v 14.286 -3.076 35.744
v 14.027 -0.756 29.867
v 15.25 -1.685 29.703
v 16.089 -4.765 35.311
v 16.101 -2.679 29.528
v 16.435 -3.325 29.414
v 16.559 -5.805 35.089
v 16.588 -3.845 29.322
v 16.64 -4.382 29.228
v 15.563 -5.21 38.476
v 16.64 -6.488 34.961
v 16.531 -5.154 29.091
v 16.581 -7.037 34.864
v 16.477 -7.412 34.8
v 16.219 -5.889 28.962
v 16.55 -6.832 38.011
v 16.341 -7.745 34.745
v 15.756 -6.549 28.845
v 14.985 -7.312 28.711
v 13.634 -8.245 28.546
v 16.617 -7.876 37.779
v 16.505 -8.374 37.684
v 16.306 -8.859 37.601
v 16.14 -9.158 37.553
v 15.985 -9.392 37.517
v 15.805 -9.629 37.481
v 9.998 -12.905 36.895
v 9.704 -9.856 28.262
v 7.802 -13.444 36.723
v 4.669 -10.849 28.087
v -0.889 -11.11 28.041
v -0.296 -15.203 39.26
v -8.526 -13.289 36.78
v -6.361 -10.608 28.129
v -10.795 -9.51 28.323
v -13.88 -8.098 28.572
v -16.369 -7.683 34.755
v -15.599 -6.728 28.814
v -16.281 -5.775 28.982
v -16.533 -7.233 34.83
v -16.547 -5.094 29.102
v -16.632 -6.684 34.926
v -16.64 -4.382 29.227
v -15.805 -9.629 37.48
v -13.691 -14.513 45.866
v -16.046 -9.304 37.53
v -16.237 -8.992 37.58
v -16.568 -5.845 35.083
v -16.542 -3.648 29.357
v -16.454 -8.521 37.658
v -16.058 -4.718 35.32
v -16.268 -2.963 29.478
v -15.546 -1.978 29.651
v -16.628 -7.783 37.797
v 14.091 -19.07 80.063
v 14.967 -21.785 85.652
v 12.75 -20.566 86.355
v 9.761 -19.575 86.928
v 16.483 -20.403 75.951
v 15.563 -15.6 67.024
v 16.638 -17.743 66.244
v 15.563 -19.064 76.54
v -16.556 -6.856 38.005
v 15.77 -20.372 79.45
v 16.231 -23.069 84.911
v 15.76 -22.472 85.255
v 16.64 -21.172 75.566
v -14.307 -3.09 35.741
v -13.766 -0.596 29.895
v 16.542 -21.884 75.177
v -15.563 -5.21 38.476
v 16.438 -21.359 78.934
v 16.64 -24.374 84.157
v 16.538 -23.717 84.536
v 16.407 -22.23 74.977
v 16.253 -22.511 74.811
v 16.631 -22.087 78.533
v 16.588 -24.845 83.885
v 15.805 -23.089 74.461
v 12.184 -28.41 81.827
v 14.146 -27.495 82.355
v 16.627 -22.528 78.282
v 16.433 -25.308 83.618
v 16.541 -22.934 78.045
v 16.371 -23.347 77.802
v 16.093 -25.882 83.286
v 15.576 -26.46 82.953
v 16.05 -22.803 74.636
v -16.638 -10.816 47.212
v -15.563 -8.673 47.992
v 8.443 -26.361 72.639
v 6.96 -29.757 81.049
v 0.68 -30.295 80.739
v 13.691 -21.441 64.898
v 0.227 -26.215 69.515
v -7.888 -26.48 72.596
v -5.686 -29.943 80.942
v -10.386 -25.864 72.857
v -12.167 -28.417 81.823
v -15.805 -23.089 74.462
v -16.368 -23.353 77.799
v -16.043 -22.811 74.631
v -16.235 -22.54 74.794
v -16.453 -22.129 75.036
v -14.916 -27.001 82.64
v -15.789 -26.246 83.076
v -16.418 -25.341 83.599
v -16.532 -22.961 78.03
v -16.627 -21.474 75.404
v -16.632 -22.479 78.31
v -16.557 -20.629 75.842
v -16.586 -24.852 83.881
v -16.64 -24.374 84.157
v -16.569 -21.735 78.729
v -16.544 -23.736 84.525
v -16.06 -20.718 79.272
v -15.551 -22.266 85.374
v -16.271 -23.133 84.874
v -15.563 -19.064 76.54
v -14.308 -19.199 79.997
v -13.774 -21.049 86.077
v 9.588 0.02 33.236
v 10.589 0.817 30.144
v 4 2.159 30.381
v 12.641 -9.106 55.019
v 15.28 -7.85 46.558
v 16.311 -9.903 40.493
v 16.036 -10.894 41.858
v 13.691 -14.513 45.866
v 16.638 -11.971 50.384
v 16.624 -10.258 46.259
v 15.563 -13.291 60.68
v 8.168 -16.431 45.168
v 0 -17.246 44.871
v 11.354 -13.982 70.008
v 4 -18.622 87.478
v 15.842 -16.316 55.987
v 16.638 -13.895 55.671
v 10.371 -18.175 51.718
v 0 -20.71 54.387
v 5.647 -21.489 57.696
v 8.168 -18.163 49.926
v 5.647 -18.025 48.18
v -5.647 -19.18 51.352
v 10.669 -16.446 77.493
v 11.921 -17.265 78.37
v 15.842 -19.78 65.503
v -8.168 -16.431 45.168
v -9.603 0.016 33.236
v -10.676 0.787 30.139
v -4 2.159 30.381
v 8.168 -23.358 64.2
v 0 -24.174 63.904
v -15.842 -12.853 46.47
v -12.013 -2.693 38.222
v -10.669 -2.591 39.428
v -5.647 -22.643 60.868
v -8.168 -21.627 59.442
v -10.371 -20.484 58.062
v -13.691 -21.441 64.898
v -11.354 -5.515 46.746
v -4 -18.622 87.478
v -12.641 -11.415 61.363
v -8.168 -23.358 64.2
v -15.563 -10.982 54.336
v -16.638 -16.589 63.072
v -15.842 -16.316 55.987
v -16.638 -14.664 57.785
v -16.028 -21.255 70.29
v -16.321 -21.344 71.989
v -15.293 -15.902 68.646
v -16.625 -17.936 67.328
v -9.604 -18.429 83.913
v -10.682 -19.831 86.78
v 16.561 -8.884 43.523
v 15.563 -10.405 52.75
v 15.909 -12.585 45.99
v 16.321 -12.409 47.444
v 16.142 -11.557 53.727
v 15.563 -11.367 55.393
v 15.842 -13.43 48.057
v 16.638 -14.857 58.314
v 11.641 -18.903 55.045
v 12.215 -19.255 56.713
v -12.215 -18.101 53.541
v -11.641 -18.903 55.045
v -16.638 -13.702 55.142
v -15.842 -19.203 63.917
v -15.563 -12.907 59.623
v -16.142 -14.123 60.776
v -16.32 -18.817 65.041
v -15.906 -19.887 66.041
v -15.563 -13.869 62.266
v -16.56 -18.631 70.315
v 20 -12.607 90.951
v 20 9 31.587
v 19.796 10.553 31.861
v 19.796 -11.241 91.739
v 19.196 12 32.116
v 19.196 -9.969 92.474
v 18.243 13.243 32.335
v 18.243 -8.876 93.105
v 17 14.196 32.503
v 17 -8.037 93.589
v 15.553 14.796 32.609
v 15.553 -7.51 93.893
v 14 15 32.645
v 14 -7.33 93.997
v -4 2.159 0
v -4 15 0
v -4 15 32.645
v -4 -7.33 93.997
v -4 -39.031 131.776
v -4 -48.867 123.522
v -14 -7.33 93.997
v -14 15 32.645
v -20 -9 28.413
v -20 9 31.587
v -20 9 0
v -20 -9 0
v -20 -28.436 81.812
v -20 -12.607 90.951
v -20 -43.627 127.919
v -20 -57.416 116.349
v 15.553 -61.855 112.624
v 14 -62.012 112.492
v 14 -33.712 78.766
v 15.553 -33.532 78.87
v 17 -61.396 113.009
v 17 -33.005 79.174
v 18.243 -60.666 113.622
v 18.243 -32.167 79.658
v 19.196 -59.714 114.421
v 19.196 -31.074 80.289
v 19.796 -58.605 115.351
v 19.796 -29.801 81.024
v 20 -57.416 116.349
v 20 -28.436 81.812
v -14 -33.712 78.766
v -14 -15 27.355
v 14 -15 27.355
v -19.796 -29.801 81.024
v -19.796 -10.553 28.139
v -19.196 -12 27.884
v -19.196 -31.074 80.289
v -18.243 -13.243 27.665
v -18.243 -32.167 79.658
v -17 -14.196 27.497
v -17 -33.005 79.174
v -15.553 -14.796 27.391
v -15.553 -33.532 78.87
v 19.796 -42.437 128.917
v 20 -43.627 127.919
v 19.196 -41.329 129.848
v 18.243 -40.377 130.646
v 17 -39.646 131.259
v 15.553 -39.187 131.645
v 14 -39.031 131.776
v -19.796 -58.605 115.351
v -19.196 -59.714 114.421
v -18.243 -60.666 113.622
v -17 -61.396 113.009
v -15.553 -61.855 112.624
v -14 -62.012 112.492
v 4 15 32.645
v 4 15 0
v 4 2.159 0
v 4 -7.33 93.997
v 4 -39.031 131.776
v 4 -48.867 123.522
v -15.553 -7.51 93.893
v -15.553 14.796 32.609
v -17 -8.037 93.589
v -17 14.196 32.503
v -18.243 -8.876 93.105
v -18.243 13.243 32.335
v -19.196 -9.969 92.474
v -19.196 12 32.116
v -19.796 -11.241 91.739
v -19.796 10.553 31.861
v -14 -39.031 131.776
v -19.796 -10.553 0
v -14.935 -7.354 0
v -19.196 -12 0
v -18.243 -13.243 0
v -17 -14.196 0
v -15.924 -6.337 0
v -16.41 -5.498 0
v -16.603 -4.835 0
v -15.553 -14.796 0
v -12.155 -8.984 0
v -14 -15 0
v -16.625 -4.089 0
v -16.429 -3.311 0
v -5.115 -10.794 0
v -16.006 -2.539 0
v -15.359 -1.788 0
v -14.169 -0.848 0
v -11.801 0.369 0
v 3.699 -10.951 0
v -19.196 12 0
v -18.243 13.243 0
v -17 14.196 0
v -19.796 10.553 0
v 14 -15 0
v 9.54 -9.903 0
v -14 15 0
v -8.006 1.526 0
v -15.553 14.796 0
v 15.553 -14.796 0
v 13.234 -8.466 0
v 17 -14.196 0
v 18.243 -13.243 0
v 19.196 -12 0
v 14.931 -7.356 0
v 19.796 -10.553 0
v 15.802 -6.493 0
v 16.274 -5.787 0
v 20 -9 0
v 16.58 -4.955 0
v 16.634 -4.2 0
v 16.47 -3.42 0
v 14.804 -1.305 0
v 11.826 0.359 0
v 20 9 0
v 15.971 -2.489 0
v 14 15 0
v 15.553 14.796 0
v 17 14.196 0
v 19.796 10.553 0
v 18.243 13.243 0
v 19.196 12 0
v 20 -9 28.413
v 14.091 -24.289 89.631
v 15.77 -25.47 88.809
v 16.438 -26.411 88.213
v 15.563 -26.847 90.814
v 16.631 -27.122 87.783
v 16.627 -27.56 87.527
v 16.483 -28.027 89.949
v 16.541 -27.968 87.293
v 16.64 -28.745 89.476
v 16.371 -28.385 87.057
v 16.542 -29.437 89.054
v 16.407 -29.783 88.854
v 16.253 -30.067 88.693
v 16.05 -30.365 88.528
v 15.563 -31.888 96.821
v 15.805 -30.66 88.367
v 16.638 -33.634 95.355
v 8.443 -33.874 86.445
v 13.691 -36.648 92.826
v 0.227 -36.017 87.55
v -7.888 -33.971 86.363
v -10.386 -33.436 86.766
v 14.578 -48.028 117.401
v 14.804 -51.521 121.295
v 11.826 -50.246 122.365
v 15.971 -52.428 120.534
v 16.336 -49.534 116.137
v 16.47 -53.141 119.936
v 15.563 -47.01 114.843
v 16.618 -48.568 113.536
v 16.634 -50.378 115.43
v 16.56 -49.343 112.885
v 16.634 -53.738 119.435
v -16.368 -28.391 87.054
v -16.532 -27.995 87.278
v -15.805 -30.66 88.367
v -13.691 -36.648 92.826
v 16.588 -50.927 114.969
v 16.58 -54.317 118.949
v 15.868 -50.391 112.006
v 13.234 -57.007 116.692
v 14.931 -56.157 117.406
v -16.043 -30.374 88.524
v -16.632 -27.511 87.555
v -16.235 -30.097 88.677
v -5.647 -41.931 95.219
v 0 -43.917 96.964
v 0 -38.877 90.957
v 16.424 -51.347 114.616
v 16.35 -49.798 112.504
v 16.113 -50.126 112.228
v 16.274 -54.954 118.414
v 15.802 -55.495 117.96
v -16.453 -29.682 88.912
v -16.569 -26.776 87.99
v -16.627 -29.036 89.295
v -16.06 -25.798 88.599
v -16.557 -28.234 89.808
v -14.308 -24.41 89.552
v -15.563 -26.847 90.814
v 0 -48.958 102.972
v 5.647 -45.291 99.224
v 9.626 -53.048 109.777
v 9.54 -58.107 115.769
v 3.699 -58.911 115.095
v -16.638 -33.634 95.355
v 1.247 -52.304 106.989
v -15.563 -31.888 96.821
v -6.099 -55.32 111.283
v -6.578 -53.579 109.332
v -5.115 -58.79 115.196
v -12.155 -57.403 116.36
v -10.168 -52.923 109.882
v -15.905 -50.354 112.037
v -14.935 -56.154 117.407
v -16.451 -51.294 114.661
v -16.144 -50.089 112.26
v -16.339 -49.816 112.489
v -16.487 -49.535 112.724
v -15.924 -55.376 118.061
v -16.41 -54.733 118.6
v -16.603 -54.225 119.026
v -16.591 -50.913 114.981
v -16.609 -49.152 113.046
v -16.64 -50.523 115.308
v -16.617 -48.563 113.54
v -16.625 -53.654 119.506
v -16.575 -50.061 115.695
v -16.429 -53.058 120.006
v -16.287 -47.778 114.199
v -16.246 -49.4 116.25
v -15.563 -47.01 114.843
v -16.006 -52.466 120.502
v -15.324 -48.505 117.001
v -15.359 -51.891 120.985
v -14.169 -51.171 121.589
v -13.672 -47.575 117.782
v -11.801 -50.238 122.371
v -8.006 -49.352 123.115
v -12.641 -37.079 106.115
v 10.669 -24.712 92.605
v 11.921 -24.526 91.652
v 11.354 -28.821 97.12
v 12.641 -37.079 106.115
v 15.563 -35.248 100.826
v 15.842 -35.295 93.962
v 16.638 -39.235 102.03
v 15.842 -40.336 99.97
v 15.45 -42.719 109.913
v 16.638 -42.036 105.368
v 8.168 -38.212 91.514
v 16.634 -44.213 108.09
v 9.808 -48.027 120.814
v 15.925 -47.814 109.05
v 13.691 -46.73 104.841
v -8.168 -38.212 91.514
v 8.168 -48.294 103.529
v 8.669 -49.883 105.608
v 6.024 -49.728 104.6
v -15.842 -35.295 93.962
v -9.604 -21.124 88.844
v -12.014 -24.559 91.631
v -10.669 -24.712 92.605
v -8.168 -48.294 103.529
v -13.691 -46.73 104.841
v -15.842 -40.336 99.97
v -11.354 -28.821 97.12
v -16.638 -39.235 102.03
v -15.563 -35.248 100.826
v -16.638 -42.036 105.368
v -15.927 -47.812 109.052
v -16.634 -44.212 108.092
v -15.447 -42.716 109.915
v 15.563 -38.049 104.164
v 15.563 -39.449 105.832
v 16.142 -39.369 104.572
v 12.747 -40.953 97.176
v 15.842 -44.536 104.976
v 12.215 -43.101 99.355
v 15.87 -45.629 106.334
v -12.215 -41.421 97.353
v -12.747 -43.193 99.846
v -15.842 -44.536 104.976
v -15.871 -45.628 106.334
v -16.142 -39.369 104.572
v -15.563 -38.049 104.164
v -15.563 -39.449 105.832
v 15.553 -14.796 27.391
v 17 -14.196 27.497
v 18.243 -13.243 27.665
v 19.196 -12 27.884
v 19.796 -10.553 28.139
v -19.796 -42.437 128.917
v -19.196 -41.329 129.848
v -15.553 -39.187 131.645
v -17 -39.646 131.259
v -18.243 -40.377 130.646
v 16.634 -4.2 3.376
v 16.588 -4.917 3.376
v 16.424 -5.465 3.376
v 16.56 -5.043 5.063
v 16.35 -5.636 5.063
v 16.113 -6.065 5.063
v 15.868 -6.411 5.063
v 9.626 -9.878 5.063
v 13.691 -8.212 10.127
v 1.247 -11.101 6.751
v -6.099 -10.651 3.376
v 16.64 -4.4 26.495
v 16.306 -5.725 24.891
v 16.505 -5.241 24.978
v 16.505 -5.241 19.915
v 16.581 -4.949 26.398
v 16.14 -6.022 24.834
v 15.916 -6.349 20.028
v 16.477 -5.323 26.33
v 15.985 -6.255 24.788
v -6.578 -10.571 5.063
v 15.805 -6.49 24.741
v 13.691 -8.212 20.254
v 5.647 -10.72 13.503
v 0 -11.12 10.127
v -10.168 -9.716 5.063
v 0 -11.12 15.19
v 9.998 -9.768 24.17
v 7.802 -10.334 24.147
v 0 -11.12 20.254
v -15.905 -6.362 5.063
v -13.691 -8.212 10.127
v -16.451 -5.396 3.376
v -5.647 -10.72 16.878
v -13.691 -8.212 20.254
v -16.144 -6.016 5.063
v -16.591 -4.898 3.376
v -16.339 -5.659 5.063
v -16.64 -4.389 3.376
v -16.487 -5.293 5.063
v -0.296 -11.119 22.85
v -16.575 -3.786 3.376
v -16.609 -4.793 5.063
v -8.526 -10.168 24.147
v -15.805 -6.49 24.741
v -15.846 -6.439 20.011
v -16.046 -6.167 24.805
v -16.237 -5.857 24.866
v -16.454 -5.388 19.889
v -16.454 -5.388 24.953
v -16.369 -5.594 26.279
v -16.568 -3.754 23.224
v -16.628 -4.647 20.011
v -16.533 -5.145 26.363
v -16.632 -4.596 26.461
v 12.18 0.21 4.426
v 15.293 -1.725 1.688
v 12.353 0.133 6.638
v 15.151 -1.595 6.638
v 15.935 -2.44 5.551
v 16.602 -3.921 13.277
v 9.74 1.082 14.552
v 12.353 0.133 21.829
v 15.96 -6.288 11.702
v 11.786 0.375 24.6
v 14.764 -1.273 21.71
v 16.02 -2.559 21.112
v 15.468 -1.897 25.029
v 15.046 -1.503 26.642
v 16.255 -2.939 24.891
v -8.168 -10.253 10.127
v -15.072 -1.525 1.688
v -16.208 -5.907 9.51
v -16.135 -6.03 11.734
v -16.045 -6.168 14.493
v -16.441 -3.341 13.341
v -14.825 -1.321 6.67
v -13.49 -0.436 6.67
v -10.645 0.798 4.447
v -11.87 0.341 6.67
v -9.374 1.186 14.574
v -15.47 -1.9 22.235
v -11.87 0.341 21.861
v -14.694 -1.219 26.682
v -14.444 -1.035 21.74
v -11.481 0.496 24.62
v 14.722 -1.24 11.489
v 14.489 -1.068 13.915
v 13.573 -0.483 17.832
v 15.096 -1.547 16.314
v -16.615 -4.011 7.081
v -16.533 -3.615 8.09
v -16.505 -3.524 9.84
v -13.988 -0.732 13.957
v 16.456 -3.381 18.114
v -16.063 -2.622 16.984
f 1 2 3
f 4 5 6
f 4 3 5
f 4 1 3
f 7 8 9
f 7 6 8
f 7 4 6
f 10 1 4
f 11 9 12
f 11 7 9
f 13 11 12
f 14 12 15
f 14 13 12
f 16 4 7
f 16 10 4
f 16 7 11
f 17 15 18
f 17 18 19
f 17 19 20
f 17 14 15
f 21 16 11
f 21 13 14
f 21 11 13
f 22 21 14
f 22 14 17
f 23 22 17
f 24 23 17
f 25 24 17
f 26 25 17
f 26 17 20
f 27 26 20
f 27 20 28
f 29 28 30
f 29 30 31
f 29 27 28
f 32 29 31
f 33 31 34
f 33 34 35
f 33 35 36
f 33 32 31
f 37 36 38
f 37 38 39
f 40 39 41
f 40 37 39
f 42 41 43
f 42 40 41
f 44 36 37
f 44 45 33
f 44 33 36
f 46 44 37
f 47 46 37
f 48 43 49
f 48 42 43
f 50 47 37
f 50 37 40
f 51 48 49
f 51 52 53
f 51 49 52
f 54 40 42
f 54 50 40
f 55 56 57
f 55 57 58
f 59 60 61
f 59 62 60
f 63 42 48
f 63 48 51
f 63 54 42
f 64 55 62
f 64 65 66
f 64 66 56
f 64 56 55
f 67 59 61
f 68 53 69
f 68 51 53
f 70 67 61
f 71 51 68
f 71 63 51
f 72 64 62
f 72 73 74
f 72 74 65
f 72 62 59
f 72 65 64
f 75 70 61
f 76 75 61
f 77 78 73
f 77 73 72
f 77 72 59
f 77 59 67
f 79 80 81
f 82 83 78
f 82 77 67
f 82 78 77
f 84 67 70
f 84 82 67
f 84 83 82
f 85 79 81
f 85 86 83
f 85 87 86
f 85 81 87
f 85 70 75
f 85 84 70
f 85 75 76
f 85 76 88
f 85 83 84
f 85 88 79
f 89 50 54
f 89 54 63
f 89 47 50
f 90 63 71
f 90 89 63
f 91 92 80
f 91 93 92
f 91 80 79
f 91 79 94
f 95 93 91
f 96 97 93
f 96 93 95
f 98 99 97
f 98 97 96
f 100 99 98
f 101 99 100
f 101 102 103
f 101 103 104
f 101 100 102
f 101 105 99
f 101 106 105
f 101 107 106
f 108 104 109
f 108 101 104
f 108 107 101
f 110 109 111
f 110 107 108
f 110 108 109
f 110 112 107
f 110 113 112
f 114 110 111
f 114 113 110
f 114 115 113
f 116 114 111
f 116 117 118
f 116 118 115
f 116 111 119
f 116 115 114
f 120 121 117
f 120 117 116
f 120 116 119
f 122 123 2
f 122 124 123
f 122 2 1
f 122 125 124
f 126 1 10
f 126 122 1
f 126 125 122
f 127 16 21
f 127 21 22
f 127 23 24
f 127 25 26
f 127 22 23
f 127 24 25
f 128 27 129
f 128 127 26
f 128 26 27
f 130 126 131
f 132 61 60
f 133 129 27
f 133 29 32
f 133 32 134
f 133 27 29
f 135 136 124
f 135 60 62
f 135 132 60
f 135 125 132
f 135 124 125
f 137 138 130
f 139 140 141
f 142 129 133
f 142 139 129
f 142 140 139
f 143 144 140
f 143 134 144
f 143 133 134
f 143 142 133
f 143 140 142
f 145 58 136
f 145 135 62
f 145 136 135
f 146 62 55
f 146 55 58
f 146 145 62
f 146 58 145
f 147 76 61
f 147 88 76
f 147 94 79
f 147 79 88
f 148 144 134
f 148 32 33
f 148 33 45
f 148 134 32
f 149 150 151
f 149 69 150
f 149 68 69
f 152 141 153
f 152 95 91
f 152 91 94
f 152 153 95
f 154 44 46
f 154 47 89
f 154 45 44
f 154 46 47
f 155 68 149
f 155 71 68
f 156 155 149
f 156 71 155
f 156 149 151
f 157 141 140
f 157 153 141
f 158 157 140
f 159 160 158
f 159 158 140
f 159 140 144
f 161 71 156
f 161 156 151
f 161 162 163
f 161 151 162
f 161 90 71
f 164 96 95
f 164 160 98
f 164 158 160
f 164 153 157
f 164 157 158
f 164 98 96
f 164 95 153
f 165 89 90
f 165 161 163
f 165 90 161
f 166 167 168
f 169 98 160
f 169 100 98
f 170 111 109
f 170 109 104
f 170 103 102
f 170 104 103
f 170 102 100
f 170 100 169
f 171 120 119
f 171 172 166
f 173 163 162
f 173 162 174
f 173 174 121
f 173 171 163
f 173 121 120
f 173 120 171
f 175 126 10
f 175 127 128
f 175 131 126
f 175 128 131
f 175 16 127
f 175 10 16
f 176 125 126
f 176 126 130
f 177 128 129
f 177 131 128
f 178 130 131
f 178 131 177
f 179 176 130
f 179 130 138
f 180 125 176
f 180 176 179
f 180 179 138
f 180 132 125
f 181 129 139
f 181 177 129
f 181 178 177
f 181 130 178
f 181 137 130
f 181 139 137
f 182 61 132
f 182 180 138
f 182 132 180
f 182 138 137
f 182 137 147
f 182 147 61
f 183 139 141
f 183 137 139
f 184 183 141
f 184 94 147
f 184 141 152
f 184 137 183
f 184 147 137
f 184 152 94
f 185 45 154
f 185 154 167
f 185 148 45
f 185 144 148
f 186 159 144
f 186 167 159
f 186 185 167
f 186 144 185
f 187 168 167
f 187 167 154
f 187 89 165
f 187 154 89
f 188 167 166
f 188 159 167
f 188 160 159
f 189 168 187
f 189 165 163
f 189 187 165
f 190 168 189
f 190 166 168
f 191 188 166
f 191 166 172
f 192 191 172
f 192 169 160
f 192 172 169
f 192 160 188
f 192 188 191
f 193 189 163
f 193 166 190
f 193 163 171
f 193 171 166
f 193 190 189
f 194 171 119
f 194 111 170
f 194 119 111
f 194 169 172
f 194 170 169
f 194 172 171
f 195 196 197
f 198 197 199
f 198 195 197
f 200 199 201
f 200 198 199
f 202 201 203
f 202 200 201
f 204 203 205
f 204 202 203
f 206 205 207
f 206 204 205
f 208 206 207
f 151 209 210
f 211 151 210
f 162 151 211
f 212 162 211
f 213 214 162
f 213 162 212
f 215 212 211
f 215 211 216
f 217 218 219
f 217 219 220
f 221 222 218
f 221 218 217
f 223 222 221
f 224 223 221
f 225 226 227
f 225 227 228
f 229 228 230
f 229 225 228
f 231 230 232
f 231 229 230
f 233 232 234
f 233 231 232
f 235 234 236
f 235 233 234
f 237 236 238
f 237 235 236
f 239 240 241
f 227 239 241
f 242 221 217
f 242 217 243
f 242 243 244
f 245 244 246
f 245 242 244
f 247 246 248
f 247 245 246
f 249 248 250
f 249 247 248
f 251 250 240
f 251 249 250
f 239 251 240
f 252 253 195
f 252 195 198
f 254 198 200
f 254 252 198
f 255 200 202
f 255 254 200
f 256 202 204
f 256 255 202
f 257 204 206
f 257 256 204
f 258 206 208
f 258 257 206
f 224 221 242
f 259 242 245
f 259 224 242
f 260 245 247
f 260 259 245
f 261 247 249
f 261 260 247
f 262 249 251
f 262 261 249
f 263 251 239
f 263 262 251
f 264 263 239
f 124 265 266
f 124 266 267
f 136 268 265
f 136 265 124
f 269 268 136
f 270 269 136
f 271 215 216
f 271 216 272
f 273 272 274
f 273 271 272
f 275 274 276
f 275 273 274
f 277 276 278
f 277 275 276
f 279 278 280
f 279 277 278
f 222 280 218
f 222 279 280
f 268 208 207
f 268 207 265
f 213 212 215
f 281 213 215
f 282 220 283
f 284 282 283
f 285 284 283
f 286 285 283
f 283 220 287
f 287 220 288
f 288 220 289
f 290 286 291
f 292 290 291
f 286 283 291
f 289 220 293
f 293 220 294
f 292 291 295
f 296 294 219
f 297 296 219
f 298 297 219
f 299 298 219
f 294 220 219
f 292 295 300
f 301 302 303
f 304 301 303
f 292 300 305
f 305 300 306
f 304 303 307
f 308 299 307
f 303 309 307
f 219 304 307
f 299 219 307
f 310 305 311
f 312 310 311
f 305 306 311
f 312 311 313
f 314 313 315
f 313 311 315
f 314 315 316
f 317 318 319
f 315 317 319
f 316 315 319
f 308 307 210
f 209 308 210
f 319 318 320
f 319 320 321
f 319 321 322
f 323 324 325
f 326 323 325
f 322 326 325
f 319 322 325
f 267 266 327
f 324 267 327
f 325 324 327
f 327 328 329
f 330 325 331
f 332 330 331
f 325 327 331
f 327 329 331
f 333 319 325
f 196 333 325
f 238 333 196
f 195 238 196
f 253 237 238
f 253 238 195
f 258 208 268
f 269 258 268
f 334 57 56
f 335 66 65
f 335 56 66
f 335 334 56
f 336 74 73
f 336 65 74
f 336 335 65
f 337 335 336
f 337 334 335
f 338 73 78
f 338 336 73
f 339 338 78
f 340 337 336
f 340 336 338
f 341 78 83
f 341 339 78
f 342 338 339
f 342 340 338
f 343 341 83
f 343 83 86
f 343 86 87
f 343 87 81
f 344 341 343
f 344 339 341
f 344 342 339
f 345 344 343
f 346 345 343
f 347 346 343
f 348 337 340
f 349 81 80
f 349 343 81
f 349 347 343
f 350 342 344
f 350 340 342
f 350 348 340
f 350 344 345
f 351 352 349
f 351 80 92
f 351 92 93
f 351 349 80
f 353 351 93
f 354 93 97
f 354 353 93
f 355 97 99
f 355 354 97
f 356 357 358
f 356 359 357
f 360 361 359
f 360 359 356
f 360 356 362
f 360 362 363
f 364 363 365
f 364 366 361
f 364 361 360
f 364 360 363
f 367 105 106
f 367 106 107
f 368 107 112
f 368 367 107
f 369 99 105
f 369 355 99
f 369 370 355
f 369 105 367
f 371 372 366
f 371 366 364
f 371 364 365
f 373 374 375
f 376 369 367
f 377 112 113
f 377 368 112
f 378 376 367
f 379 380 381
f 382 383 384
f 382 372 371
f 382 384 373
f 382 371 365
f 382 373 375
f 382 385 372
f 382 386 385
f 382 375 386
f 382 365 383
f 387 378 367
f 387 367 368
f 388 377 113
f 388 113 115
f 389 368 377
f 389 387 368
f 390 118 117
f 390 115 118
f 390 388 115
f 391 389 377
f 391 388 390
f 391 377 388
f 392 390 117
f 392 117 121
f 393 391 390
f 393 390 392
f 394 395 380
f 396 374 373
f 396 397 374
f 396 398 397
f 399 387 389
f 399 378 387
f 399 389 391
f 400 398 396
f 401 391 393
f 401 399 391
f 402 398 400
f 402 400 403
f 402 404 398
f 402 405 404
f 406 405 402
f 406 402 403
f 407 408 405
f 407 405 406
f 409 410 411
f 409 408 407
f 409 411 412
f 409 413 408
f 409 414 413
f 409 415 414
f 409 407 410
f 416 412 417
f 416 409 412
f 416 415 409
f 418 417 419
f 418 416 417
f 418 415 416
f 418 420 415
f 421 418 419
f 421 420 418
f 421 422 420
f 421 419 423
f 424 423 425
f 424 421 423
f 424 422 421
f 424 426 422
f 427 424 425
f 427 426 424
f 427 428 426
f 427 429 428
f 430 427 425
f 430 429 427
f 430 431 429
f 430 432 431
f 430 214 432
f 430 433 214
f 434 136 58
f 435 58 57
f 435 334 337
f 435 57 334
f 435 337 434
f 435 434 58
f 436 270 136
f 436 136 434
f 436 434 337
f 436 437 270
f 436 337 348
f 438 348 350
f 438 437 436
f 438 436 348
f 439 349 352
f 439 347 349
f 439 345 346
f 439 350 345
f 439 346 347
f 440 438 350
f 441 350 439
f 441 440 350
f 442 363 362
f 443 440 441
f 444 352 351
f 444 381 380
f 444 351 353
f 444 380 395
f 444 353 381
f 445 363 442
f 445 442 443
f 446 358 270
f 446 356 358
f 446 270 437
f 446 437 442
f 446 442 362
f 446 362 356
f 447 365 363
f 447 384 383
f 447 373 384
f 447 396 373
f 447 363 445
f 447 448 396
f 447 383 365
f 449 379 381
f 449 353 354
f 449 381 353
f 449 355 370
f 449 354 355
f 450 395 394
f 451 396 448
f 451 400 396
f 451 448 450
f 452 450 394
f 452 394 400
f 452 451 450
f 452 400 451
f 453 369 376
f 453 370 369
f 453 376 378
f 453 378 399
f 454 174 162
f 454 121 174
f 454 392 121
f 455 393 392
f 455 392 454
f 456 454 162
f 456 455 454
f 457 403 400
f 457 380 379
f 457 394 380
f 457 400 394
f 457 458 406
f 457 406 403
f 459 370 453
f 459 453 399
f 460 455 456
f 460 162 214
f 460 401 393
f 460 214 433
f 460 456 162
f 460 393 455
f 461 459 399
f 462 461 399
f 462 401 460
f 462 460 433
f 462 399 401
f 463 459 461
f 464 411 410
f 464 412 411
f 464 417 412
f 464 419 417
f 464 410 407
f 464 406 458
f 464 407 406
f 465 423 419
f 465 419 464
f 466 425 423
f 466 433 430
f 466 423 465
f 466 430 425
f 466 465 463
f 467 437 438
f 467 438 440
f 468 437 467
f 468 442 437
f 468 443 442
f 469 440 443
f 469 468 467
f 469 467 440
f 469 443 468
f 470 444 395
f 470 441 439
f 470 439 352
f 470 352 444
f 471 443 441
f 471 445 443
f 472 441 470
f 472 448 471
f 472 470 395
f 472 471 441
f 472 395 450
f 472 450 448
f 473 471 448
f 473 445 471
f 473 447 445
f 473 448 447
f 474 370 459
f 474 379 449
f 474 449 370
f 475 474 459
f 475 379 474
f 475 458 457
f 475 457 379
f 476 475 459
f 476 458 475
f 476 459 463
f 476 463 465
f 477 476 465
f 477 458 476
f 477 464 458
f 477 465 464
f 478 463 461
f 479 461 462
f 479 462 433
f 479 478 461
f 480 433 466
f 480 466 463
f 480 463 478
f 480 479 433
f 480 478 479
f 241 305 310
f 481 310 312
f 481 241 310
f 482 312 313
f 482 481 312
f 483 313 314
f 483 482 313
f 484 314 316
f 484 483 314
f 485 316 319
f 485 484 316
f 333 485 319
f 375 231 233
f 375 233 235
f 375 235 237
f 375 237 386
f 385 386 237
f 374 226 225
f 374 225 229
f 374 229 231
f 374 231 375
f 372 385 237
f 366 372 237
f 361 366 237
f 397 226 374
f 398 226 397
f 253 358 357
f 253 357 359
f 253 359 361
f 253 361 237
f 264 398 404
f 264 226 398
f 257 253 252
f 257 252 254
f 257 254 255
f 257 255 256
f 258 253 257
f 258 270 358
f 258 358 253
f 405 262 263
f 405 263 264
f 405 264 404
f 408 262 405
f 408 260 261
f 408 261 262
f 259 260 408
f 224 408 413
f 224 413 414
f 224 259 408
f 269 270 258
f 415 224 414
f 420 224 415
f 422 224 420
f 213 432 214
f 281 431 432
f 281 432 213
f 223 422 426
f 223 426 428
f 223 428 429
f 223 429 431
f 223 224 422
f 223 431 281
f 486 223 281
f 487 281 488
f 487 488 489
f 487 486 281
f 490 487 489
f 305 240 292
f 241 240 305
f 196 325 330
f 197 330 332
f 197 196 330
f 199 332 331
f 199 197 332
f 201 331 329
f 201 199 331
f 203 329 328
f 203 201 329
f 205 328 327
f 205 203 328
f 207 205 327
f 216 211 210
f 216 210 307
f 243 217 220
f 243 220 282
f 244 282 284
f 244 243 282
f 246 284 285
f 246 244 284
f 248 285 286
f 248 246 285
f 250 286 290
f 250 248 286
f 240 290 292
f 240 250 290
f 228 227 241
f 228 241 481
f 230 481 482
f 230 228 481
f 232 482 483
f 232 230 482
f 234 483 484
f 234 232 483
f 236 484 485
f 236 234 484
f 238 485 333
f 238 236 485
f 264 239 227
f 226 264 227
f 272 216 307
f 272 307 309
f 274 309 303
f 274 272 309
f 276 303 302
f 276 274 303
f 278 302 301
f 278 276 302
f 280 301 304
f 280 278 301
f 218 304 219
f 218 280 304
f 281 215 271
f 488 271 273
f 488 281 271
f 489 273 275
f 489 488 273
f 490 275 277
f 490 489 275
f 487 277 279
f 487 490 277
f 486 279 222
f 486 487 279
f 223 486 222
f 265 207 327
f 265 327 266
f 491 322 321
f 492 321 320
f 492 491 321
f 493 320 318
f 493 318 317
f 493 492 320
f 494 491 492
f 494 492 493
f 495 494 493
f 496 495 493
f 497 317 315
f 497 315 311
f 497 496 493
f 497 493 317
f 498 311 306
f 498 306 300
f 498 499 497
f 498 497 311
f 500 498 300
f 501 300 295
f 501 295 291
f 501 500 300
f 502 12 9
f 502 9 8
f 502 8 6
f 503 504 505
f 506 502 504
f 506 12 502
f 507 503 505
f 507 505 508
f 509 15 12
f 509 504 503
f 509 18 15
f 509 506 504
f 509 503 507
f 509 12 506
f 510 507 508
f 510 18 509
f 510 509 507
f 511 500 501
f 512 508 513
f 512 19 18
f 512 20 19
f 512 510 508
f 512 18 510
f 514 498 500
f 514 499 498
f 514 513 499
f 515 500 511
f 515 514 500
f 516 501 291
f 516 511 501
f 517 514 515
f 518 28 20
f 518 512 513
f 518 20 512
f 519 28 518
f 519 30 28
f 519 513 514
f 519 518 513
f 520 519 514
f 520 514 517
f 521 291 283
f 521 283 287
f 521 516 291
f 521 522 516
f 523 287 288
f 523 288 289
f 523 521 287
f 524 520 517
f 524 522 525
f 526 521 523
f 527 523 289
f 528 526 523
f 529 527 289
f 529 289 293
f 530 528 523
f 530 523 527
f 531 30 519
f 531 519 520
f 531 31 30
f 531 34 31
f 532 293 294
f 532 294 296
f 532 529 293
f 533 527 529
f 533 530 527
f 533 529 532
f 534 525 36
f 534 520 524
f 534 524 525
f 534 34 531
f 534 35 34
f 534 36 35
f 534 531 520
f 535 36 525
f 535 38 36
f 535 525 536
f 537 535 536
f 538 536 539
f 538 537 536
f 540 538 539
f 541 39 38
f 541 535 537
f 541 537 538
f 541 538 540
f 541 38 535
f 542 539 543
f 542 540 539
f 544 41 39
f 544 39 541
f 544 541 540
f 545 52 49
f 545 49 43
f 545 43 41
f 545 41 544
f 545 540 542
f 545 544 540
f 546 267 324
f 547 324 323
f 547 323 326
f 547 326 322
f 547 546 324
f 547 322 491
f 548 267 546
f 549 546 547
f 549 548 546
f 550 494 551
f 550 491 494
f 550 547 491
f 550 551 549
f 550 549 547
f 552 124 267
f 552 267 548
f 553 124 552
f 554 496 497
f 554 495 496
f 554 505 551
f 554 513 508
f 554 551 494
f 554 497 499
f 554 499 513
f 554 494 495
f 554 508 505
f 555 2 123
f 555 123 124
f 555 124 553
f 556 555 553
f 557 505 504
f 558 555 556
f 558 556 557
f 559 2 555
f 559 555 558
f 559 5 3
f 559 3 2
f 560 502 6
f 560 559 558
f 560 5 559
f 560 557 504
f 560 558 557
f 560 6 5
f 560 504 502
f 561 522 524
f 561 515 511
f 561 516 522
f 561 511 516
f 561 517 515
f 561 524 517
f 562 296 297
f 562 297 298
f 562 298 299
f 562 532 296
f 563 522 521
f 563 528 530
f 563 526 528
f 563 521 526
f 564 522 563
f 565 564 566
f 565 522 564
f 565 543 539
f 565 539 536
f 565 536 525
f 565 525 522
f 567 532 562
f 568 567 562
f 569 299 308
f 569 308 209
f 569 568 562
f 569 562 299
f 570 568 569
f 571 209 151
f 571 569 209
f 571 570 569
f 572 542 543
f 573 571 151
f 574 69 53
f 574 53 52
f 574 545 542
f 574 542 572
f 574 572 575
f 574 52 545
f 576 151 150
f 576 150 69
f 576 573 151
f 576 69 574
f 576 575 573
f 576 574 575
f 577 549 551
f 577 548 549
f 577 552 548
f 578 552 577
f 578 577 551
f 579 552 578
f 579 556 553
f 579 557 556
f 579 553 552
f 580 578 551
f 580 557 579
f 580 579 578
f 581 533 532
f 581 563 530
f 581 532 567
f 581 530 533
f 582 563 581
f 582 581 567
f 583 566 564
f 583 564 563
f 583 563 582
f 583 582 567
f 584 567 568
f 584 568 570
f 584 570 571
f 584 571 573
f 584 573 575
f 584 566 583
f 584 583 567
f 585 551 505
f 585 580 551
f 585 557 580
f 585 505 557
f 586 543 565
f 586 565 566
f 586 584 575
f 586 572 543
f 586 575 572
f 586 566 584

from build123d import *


with BuildPart() as f2:
    # F2: sweep along a path in F1
    with BuildLine(Plane.YZ) as f2_path:
        Line((0, 0), (0, 30))
        Line((0, 30), (-20.5212085995, 86.3815572472))
        Line((-20.5212085995, 86.3815572472), (-50.5212085995, 122.134165025))
    # F0 (on Top) → F2 (sweep)
    with BuildSketch(Plane.XY):
        with BuildLine():
            Line((-14, -15), (14, -15))
            ThreePointArc((14, -15), (18.2426406871, -13.2426406871), (20, -9))
            Line((20, -9), (20, 9))
            ThreePointArc((20, 9), (18.2426406871, 13.2426406871), (14, 15))
            Line((14, 15), (4, 15))
            Line((4, 15), (4, 2.1593614055))
            add(Edge.make_bspline(
                [(-4, 2.1593614055), (-27.382723871, -0.1854807252), (-13.6913619355, -8.2115012982), (0, -16.2375218712), (13.6913619355, -8.2115012982), (27.382723871, -0.1854807252), (4, 2.1593614055)],
                knots=[4.9551445309, 4.9551445309, 4.9551445309, 6.8877025996, 6.8877025996, 8.8202606683, 8.8202606683, 10.752818737, 10.752818737, 10.752818737], degree=2, weights=[1, 0.568364982, 1, 0.568364982, 1, 0.568364982, 1]))
            Line((-4, 2.1593614055), (-4, 15))
            Line((-4, 15), (-14, 15))
            ThreePointArc((-14, 15), (-18.2426406871, 13.2426406871), (-20, 9))
            Line((-20, 9), (-20, -9))
            ThreePointArc((-20, -9), (-18.2426406871, -13.2426406871), (-14, -15))
        make_face()
    sweep(path=f2_path.line, transition=Transition.RIGHT)


solid = f2.part
